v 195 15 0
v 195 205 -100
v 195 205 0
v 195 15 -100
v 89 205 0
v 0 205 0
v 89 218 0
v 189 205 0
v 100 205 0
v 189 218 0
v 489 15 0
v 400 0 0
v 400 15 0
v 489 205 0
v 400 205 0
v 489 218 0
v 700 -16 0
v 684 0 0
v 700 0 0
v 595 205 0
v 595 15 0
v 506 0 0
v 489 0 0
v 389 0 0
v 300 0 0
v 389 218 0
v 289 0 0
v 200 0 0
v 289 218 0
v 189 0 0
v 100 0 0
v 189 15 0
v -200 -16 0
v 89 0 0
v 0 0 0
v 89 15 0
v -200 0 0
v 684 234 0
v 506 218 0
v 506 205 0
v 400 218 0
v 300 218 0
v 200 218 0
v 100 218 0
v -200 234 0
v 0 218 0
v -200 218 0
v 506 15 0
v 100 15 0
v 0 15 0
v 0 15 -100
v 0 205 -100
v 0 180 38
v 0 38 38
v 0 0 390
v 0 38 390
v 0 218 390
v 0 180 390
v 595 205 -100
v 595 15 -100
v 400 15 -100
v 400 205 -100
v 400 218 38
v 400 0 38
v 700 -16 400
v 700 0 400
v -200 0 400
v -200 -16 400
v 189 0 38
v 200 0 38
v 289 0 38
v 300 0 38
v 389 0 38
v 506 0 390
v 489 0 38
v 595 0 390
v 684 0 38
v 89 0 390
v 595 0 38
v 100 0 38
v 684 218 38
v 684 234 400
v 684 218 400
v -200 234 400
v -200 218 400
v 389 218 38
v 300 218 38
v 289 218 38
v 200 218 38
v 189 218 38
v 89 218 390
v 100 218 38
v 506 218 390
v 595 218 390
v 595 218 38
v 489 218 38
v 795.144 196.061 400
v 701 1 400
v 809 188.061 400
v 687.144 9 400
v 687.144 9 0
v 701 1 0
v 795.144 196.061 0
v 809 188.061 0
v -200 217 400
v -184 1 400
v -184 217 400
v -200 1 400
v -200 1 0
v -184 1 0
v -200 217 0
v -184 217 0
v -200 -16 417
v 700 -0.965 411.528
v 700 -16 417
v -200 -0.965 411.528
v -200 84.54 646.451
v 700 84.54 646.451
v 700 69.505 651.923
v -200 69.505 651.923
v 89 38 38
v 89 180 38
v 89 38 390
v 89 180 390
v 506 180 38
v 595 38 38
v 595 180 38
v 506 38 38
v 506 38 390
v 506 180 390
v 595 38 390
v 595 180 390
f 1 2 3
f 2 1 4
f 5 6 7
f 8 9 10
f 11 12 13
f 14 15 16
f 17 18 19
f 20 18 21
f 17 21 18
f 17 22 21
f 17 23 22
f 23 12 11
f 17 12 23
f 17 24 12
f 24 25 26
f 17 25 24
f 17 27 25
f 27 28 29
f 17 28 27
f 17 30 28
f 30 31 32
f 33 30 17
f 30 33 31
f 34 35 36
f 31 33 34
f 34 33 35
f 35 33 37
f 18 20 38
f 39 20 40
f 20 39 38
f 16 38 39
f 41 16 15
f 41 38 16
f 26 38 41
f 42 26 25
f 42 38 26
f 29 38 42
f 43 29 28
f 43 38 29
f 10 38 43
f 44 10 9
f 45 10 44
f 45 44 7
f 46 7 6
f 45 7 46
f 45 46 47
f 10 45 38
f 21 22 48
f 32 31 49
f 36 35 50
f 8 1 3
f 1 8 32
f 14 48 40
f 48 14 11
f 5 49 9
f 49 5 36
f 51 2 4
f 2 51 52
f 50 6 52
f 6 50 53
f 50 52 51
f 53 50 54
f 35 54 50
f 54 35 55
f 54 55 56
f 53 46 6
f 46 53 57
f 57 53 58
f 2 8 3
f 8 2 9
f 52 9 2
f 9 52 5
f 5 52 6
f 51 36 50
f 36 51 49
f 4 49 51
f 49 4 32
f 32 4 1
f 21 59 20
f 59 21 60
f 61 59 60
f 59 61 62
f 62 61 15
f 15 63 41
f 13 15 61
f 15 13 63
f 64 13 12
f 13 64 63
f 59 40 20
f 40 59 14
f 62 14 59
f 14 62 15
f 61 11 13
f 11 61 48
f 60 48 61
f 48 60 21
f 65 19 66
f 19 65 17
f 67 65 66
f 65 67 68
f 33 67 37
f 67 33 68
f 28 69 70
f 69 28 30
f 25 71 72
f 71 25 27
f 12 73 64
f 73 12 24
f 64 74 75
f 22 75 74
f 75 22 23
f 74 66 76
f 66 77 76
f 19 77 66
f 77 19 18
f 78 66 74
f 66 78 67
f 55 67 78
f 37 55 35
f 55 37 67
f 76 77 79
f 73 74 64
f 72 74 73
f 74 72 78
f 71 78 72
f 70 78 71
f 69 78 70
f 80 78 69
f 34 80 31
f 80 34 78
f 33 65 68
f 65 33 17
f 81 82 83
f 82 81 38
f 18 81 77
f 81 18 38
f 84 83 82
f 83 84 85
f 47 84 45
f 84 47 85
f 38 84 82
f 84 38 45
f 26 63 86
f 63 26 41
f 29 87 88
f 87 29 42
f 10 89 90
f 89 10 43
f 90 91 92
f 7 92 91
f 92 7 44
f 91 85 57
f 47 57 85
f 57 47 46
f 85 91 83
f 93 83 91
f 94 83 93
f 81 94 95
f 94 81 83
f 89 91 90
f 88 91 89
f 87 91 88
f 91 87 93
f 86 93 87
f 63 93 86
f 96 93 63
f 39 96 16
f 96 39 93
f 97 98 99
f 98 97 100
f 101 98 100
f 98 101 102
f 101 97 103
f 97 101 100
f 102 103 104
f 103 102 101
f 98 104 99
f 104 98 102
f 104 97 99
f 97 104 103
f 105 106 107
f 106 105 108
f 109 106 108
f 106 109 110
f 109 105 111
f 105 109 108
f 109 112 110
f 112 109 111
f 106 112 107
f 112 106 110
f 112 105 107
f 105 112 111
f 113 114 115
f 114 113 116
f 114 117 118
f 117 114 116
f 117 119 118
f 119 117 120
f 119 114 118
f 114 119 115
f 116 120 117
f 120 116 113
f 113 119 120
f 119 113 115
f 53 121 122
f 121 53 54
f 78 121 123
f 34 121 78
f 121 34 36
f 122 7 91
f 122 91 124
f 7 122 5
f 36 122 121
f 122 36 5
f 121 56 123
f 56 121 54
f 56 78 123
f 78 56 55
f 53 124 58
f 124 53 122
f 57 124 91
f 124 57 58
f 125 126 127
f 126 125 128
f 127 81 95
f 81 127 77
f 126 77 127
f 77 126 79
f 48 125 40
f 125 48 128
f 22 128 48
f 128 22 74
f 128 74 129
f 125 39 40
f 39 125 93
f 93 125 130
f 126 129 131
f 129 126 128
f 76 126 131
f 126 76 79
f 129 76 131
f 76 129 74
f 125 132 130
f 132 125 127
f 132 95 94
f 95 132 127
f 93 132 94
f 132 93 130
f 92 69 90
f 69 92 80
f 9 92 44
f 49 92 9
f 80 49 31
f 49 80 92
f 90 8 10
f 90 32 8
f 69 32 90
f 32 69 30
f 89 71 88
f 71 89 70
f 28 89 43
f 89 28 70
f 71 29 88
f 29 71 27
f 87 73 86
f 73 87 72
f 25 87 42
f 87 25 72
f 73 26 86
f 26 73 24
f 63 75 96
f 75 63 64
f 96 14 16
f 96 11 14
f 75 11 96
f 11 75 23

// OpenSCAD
D=38;
W=89;
BD=16;

//block
blockh(0,15,-100,0,0,0);
blockh(400,15,-100,0,0,0);


//board
//FR
translate([0-200,-BD,0]) cube([900,BD,400]);
//RE
translate([0-200,250-BD*2,0]) cube([900-BD,BD,400]);
//L
translate([900-200+1,1,0]) rotate([0,0,90-30]) cube([200+BD,BD,400]);
//R
translate([0-200+BD,1,0]) rotate([0,0,90]) cube([250-BD*2-2,BD,400]);
//TOP
translate([0-200,-BD,250+150+BD+1]) rotate([-90+70,0,0]) cube([900,BD,250]);

//B
//translate([900-200-W*2-BD-400-10,0,D-BD]) rotate([90,0,90]) cube([250-BD*2,BD,400]);



//translate([140,60,100]) cube([300,100,100]);


//2x4
2x4(W,0,0,0,0,90,250-BD*2);
2x4(W,D,D,0,-90,90,400-D-10);
2x4(W,250-BD*2,D,0,-90,90,400-D-10);

2x4(900-200-BD,0,0,0,0,90,250-BD*2);
2x4(900-200-W-BD,0,0,0,0,90,250-BD*2);
2x4(900-200-W-BD,D,D,0,-90,90,400-D-10);
2x4(900-200-W-BD,250-BD*2,D,0,-90,90,400-D-10);

2x4(W+100,0,0,0,0,90,250-BD*2);
2x4(W+200,0,0,0,0,90,250-BD*2);
2x4(W+300,0,0,0,0,90,250-BD*2);
2x4(W+400,0,0,0,0,90,250-BD*2);


module blockh(X,Y,Z,RX,RY,RZ)
{
    color("LightGrey")
    translate([X,Y,Z])
    rotate([RX,RY,RZ])
    cube([390/2,190,100]);
}
module block(X,Y,Z,RX,RY,RZ)
{
    color("LightGrey")
    translate([X,Y,Z])
    rotate([RX,RY,RZ])
    cube([390,190,100]);
}


module 2x4(X,Y,Z,RX,RY,RZ,L)
{
    color("Khaki")
    translate([X,Y,Z])
    rotate([RX,RY,RZ])
    cube([L,W,D]);
}
